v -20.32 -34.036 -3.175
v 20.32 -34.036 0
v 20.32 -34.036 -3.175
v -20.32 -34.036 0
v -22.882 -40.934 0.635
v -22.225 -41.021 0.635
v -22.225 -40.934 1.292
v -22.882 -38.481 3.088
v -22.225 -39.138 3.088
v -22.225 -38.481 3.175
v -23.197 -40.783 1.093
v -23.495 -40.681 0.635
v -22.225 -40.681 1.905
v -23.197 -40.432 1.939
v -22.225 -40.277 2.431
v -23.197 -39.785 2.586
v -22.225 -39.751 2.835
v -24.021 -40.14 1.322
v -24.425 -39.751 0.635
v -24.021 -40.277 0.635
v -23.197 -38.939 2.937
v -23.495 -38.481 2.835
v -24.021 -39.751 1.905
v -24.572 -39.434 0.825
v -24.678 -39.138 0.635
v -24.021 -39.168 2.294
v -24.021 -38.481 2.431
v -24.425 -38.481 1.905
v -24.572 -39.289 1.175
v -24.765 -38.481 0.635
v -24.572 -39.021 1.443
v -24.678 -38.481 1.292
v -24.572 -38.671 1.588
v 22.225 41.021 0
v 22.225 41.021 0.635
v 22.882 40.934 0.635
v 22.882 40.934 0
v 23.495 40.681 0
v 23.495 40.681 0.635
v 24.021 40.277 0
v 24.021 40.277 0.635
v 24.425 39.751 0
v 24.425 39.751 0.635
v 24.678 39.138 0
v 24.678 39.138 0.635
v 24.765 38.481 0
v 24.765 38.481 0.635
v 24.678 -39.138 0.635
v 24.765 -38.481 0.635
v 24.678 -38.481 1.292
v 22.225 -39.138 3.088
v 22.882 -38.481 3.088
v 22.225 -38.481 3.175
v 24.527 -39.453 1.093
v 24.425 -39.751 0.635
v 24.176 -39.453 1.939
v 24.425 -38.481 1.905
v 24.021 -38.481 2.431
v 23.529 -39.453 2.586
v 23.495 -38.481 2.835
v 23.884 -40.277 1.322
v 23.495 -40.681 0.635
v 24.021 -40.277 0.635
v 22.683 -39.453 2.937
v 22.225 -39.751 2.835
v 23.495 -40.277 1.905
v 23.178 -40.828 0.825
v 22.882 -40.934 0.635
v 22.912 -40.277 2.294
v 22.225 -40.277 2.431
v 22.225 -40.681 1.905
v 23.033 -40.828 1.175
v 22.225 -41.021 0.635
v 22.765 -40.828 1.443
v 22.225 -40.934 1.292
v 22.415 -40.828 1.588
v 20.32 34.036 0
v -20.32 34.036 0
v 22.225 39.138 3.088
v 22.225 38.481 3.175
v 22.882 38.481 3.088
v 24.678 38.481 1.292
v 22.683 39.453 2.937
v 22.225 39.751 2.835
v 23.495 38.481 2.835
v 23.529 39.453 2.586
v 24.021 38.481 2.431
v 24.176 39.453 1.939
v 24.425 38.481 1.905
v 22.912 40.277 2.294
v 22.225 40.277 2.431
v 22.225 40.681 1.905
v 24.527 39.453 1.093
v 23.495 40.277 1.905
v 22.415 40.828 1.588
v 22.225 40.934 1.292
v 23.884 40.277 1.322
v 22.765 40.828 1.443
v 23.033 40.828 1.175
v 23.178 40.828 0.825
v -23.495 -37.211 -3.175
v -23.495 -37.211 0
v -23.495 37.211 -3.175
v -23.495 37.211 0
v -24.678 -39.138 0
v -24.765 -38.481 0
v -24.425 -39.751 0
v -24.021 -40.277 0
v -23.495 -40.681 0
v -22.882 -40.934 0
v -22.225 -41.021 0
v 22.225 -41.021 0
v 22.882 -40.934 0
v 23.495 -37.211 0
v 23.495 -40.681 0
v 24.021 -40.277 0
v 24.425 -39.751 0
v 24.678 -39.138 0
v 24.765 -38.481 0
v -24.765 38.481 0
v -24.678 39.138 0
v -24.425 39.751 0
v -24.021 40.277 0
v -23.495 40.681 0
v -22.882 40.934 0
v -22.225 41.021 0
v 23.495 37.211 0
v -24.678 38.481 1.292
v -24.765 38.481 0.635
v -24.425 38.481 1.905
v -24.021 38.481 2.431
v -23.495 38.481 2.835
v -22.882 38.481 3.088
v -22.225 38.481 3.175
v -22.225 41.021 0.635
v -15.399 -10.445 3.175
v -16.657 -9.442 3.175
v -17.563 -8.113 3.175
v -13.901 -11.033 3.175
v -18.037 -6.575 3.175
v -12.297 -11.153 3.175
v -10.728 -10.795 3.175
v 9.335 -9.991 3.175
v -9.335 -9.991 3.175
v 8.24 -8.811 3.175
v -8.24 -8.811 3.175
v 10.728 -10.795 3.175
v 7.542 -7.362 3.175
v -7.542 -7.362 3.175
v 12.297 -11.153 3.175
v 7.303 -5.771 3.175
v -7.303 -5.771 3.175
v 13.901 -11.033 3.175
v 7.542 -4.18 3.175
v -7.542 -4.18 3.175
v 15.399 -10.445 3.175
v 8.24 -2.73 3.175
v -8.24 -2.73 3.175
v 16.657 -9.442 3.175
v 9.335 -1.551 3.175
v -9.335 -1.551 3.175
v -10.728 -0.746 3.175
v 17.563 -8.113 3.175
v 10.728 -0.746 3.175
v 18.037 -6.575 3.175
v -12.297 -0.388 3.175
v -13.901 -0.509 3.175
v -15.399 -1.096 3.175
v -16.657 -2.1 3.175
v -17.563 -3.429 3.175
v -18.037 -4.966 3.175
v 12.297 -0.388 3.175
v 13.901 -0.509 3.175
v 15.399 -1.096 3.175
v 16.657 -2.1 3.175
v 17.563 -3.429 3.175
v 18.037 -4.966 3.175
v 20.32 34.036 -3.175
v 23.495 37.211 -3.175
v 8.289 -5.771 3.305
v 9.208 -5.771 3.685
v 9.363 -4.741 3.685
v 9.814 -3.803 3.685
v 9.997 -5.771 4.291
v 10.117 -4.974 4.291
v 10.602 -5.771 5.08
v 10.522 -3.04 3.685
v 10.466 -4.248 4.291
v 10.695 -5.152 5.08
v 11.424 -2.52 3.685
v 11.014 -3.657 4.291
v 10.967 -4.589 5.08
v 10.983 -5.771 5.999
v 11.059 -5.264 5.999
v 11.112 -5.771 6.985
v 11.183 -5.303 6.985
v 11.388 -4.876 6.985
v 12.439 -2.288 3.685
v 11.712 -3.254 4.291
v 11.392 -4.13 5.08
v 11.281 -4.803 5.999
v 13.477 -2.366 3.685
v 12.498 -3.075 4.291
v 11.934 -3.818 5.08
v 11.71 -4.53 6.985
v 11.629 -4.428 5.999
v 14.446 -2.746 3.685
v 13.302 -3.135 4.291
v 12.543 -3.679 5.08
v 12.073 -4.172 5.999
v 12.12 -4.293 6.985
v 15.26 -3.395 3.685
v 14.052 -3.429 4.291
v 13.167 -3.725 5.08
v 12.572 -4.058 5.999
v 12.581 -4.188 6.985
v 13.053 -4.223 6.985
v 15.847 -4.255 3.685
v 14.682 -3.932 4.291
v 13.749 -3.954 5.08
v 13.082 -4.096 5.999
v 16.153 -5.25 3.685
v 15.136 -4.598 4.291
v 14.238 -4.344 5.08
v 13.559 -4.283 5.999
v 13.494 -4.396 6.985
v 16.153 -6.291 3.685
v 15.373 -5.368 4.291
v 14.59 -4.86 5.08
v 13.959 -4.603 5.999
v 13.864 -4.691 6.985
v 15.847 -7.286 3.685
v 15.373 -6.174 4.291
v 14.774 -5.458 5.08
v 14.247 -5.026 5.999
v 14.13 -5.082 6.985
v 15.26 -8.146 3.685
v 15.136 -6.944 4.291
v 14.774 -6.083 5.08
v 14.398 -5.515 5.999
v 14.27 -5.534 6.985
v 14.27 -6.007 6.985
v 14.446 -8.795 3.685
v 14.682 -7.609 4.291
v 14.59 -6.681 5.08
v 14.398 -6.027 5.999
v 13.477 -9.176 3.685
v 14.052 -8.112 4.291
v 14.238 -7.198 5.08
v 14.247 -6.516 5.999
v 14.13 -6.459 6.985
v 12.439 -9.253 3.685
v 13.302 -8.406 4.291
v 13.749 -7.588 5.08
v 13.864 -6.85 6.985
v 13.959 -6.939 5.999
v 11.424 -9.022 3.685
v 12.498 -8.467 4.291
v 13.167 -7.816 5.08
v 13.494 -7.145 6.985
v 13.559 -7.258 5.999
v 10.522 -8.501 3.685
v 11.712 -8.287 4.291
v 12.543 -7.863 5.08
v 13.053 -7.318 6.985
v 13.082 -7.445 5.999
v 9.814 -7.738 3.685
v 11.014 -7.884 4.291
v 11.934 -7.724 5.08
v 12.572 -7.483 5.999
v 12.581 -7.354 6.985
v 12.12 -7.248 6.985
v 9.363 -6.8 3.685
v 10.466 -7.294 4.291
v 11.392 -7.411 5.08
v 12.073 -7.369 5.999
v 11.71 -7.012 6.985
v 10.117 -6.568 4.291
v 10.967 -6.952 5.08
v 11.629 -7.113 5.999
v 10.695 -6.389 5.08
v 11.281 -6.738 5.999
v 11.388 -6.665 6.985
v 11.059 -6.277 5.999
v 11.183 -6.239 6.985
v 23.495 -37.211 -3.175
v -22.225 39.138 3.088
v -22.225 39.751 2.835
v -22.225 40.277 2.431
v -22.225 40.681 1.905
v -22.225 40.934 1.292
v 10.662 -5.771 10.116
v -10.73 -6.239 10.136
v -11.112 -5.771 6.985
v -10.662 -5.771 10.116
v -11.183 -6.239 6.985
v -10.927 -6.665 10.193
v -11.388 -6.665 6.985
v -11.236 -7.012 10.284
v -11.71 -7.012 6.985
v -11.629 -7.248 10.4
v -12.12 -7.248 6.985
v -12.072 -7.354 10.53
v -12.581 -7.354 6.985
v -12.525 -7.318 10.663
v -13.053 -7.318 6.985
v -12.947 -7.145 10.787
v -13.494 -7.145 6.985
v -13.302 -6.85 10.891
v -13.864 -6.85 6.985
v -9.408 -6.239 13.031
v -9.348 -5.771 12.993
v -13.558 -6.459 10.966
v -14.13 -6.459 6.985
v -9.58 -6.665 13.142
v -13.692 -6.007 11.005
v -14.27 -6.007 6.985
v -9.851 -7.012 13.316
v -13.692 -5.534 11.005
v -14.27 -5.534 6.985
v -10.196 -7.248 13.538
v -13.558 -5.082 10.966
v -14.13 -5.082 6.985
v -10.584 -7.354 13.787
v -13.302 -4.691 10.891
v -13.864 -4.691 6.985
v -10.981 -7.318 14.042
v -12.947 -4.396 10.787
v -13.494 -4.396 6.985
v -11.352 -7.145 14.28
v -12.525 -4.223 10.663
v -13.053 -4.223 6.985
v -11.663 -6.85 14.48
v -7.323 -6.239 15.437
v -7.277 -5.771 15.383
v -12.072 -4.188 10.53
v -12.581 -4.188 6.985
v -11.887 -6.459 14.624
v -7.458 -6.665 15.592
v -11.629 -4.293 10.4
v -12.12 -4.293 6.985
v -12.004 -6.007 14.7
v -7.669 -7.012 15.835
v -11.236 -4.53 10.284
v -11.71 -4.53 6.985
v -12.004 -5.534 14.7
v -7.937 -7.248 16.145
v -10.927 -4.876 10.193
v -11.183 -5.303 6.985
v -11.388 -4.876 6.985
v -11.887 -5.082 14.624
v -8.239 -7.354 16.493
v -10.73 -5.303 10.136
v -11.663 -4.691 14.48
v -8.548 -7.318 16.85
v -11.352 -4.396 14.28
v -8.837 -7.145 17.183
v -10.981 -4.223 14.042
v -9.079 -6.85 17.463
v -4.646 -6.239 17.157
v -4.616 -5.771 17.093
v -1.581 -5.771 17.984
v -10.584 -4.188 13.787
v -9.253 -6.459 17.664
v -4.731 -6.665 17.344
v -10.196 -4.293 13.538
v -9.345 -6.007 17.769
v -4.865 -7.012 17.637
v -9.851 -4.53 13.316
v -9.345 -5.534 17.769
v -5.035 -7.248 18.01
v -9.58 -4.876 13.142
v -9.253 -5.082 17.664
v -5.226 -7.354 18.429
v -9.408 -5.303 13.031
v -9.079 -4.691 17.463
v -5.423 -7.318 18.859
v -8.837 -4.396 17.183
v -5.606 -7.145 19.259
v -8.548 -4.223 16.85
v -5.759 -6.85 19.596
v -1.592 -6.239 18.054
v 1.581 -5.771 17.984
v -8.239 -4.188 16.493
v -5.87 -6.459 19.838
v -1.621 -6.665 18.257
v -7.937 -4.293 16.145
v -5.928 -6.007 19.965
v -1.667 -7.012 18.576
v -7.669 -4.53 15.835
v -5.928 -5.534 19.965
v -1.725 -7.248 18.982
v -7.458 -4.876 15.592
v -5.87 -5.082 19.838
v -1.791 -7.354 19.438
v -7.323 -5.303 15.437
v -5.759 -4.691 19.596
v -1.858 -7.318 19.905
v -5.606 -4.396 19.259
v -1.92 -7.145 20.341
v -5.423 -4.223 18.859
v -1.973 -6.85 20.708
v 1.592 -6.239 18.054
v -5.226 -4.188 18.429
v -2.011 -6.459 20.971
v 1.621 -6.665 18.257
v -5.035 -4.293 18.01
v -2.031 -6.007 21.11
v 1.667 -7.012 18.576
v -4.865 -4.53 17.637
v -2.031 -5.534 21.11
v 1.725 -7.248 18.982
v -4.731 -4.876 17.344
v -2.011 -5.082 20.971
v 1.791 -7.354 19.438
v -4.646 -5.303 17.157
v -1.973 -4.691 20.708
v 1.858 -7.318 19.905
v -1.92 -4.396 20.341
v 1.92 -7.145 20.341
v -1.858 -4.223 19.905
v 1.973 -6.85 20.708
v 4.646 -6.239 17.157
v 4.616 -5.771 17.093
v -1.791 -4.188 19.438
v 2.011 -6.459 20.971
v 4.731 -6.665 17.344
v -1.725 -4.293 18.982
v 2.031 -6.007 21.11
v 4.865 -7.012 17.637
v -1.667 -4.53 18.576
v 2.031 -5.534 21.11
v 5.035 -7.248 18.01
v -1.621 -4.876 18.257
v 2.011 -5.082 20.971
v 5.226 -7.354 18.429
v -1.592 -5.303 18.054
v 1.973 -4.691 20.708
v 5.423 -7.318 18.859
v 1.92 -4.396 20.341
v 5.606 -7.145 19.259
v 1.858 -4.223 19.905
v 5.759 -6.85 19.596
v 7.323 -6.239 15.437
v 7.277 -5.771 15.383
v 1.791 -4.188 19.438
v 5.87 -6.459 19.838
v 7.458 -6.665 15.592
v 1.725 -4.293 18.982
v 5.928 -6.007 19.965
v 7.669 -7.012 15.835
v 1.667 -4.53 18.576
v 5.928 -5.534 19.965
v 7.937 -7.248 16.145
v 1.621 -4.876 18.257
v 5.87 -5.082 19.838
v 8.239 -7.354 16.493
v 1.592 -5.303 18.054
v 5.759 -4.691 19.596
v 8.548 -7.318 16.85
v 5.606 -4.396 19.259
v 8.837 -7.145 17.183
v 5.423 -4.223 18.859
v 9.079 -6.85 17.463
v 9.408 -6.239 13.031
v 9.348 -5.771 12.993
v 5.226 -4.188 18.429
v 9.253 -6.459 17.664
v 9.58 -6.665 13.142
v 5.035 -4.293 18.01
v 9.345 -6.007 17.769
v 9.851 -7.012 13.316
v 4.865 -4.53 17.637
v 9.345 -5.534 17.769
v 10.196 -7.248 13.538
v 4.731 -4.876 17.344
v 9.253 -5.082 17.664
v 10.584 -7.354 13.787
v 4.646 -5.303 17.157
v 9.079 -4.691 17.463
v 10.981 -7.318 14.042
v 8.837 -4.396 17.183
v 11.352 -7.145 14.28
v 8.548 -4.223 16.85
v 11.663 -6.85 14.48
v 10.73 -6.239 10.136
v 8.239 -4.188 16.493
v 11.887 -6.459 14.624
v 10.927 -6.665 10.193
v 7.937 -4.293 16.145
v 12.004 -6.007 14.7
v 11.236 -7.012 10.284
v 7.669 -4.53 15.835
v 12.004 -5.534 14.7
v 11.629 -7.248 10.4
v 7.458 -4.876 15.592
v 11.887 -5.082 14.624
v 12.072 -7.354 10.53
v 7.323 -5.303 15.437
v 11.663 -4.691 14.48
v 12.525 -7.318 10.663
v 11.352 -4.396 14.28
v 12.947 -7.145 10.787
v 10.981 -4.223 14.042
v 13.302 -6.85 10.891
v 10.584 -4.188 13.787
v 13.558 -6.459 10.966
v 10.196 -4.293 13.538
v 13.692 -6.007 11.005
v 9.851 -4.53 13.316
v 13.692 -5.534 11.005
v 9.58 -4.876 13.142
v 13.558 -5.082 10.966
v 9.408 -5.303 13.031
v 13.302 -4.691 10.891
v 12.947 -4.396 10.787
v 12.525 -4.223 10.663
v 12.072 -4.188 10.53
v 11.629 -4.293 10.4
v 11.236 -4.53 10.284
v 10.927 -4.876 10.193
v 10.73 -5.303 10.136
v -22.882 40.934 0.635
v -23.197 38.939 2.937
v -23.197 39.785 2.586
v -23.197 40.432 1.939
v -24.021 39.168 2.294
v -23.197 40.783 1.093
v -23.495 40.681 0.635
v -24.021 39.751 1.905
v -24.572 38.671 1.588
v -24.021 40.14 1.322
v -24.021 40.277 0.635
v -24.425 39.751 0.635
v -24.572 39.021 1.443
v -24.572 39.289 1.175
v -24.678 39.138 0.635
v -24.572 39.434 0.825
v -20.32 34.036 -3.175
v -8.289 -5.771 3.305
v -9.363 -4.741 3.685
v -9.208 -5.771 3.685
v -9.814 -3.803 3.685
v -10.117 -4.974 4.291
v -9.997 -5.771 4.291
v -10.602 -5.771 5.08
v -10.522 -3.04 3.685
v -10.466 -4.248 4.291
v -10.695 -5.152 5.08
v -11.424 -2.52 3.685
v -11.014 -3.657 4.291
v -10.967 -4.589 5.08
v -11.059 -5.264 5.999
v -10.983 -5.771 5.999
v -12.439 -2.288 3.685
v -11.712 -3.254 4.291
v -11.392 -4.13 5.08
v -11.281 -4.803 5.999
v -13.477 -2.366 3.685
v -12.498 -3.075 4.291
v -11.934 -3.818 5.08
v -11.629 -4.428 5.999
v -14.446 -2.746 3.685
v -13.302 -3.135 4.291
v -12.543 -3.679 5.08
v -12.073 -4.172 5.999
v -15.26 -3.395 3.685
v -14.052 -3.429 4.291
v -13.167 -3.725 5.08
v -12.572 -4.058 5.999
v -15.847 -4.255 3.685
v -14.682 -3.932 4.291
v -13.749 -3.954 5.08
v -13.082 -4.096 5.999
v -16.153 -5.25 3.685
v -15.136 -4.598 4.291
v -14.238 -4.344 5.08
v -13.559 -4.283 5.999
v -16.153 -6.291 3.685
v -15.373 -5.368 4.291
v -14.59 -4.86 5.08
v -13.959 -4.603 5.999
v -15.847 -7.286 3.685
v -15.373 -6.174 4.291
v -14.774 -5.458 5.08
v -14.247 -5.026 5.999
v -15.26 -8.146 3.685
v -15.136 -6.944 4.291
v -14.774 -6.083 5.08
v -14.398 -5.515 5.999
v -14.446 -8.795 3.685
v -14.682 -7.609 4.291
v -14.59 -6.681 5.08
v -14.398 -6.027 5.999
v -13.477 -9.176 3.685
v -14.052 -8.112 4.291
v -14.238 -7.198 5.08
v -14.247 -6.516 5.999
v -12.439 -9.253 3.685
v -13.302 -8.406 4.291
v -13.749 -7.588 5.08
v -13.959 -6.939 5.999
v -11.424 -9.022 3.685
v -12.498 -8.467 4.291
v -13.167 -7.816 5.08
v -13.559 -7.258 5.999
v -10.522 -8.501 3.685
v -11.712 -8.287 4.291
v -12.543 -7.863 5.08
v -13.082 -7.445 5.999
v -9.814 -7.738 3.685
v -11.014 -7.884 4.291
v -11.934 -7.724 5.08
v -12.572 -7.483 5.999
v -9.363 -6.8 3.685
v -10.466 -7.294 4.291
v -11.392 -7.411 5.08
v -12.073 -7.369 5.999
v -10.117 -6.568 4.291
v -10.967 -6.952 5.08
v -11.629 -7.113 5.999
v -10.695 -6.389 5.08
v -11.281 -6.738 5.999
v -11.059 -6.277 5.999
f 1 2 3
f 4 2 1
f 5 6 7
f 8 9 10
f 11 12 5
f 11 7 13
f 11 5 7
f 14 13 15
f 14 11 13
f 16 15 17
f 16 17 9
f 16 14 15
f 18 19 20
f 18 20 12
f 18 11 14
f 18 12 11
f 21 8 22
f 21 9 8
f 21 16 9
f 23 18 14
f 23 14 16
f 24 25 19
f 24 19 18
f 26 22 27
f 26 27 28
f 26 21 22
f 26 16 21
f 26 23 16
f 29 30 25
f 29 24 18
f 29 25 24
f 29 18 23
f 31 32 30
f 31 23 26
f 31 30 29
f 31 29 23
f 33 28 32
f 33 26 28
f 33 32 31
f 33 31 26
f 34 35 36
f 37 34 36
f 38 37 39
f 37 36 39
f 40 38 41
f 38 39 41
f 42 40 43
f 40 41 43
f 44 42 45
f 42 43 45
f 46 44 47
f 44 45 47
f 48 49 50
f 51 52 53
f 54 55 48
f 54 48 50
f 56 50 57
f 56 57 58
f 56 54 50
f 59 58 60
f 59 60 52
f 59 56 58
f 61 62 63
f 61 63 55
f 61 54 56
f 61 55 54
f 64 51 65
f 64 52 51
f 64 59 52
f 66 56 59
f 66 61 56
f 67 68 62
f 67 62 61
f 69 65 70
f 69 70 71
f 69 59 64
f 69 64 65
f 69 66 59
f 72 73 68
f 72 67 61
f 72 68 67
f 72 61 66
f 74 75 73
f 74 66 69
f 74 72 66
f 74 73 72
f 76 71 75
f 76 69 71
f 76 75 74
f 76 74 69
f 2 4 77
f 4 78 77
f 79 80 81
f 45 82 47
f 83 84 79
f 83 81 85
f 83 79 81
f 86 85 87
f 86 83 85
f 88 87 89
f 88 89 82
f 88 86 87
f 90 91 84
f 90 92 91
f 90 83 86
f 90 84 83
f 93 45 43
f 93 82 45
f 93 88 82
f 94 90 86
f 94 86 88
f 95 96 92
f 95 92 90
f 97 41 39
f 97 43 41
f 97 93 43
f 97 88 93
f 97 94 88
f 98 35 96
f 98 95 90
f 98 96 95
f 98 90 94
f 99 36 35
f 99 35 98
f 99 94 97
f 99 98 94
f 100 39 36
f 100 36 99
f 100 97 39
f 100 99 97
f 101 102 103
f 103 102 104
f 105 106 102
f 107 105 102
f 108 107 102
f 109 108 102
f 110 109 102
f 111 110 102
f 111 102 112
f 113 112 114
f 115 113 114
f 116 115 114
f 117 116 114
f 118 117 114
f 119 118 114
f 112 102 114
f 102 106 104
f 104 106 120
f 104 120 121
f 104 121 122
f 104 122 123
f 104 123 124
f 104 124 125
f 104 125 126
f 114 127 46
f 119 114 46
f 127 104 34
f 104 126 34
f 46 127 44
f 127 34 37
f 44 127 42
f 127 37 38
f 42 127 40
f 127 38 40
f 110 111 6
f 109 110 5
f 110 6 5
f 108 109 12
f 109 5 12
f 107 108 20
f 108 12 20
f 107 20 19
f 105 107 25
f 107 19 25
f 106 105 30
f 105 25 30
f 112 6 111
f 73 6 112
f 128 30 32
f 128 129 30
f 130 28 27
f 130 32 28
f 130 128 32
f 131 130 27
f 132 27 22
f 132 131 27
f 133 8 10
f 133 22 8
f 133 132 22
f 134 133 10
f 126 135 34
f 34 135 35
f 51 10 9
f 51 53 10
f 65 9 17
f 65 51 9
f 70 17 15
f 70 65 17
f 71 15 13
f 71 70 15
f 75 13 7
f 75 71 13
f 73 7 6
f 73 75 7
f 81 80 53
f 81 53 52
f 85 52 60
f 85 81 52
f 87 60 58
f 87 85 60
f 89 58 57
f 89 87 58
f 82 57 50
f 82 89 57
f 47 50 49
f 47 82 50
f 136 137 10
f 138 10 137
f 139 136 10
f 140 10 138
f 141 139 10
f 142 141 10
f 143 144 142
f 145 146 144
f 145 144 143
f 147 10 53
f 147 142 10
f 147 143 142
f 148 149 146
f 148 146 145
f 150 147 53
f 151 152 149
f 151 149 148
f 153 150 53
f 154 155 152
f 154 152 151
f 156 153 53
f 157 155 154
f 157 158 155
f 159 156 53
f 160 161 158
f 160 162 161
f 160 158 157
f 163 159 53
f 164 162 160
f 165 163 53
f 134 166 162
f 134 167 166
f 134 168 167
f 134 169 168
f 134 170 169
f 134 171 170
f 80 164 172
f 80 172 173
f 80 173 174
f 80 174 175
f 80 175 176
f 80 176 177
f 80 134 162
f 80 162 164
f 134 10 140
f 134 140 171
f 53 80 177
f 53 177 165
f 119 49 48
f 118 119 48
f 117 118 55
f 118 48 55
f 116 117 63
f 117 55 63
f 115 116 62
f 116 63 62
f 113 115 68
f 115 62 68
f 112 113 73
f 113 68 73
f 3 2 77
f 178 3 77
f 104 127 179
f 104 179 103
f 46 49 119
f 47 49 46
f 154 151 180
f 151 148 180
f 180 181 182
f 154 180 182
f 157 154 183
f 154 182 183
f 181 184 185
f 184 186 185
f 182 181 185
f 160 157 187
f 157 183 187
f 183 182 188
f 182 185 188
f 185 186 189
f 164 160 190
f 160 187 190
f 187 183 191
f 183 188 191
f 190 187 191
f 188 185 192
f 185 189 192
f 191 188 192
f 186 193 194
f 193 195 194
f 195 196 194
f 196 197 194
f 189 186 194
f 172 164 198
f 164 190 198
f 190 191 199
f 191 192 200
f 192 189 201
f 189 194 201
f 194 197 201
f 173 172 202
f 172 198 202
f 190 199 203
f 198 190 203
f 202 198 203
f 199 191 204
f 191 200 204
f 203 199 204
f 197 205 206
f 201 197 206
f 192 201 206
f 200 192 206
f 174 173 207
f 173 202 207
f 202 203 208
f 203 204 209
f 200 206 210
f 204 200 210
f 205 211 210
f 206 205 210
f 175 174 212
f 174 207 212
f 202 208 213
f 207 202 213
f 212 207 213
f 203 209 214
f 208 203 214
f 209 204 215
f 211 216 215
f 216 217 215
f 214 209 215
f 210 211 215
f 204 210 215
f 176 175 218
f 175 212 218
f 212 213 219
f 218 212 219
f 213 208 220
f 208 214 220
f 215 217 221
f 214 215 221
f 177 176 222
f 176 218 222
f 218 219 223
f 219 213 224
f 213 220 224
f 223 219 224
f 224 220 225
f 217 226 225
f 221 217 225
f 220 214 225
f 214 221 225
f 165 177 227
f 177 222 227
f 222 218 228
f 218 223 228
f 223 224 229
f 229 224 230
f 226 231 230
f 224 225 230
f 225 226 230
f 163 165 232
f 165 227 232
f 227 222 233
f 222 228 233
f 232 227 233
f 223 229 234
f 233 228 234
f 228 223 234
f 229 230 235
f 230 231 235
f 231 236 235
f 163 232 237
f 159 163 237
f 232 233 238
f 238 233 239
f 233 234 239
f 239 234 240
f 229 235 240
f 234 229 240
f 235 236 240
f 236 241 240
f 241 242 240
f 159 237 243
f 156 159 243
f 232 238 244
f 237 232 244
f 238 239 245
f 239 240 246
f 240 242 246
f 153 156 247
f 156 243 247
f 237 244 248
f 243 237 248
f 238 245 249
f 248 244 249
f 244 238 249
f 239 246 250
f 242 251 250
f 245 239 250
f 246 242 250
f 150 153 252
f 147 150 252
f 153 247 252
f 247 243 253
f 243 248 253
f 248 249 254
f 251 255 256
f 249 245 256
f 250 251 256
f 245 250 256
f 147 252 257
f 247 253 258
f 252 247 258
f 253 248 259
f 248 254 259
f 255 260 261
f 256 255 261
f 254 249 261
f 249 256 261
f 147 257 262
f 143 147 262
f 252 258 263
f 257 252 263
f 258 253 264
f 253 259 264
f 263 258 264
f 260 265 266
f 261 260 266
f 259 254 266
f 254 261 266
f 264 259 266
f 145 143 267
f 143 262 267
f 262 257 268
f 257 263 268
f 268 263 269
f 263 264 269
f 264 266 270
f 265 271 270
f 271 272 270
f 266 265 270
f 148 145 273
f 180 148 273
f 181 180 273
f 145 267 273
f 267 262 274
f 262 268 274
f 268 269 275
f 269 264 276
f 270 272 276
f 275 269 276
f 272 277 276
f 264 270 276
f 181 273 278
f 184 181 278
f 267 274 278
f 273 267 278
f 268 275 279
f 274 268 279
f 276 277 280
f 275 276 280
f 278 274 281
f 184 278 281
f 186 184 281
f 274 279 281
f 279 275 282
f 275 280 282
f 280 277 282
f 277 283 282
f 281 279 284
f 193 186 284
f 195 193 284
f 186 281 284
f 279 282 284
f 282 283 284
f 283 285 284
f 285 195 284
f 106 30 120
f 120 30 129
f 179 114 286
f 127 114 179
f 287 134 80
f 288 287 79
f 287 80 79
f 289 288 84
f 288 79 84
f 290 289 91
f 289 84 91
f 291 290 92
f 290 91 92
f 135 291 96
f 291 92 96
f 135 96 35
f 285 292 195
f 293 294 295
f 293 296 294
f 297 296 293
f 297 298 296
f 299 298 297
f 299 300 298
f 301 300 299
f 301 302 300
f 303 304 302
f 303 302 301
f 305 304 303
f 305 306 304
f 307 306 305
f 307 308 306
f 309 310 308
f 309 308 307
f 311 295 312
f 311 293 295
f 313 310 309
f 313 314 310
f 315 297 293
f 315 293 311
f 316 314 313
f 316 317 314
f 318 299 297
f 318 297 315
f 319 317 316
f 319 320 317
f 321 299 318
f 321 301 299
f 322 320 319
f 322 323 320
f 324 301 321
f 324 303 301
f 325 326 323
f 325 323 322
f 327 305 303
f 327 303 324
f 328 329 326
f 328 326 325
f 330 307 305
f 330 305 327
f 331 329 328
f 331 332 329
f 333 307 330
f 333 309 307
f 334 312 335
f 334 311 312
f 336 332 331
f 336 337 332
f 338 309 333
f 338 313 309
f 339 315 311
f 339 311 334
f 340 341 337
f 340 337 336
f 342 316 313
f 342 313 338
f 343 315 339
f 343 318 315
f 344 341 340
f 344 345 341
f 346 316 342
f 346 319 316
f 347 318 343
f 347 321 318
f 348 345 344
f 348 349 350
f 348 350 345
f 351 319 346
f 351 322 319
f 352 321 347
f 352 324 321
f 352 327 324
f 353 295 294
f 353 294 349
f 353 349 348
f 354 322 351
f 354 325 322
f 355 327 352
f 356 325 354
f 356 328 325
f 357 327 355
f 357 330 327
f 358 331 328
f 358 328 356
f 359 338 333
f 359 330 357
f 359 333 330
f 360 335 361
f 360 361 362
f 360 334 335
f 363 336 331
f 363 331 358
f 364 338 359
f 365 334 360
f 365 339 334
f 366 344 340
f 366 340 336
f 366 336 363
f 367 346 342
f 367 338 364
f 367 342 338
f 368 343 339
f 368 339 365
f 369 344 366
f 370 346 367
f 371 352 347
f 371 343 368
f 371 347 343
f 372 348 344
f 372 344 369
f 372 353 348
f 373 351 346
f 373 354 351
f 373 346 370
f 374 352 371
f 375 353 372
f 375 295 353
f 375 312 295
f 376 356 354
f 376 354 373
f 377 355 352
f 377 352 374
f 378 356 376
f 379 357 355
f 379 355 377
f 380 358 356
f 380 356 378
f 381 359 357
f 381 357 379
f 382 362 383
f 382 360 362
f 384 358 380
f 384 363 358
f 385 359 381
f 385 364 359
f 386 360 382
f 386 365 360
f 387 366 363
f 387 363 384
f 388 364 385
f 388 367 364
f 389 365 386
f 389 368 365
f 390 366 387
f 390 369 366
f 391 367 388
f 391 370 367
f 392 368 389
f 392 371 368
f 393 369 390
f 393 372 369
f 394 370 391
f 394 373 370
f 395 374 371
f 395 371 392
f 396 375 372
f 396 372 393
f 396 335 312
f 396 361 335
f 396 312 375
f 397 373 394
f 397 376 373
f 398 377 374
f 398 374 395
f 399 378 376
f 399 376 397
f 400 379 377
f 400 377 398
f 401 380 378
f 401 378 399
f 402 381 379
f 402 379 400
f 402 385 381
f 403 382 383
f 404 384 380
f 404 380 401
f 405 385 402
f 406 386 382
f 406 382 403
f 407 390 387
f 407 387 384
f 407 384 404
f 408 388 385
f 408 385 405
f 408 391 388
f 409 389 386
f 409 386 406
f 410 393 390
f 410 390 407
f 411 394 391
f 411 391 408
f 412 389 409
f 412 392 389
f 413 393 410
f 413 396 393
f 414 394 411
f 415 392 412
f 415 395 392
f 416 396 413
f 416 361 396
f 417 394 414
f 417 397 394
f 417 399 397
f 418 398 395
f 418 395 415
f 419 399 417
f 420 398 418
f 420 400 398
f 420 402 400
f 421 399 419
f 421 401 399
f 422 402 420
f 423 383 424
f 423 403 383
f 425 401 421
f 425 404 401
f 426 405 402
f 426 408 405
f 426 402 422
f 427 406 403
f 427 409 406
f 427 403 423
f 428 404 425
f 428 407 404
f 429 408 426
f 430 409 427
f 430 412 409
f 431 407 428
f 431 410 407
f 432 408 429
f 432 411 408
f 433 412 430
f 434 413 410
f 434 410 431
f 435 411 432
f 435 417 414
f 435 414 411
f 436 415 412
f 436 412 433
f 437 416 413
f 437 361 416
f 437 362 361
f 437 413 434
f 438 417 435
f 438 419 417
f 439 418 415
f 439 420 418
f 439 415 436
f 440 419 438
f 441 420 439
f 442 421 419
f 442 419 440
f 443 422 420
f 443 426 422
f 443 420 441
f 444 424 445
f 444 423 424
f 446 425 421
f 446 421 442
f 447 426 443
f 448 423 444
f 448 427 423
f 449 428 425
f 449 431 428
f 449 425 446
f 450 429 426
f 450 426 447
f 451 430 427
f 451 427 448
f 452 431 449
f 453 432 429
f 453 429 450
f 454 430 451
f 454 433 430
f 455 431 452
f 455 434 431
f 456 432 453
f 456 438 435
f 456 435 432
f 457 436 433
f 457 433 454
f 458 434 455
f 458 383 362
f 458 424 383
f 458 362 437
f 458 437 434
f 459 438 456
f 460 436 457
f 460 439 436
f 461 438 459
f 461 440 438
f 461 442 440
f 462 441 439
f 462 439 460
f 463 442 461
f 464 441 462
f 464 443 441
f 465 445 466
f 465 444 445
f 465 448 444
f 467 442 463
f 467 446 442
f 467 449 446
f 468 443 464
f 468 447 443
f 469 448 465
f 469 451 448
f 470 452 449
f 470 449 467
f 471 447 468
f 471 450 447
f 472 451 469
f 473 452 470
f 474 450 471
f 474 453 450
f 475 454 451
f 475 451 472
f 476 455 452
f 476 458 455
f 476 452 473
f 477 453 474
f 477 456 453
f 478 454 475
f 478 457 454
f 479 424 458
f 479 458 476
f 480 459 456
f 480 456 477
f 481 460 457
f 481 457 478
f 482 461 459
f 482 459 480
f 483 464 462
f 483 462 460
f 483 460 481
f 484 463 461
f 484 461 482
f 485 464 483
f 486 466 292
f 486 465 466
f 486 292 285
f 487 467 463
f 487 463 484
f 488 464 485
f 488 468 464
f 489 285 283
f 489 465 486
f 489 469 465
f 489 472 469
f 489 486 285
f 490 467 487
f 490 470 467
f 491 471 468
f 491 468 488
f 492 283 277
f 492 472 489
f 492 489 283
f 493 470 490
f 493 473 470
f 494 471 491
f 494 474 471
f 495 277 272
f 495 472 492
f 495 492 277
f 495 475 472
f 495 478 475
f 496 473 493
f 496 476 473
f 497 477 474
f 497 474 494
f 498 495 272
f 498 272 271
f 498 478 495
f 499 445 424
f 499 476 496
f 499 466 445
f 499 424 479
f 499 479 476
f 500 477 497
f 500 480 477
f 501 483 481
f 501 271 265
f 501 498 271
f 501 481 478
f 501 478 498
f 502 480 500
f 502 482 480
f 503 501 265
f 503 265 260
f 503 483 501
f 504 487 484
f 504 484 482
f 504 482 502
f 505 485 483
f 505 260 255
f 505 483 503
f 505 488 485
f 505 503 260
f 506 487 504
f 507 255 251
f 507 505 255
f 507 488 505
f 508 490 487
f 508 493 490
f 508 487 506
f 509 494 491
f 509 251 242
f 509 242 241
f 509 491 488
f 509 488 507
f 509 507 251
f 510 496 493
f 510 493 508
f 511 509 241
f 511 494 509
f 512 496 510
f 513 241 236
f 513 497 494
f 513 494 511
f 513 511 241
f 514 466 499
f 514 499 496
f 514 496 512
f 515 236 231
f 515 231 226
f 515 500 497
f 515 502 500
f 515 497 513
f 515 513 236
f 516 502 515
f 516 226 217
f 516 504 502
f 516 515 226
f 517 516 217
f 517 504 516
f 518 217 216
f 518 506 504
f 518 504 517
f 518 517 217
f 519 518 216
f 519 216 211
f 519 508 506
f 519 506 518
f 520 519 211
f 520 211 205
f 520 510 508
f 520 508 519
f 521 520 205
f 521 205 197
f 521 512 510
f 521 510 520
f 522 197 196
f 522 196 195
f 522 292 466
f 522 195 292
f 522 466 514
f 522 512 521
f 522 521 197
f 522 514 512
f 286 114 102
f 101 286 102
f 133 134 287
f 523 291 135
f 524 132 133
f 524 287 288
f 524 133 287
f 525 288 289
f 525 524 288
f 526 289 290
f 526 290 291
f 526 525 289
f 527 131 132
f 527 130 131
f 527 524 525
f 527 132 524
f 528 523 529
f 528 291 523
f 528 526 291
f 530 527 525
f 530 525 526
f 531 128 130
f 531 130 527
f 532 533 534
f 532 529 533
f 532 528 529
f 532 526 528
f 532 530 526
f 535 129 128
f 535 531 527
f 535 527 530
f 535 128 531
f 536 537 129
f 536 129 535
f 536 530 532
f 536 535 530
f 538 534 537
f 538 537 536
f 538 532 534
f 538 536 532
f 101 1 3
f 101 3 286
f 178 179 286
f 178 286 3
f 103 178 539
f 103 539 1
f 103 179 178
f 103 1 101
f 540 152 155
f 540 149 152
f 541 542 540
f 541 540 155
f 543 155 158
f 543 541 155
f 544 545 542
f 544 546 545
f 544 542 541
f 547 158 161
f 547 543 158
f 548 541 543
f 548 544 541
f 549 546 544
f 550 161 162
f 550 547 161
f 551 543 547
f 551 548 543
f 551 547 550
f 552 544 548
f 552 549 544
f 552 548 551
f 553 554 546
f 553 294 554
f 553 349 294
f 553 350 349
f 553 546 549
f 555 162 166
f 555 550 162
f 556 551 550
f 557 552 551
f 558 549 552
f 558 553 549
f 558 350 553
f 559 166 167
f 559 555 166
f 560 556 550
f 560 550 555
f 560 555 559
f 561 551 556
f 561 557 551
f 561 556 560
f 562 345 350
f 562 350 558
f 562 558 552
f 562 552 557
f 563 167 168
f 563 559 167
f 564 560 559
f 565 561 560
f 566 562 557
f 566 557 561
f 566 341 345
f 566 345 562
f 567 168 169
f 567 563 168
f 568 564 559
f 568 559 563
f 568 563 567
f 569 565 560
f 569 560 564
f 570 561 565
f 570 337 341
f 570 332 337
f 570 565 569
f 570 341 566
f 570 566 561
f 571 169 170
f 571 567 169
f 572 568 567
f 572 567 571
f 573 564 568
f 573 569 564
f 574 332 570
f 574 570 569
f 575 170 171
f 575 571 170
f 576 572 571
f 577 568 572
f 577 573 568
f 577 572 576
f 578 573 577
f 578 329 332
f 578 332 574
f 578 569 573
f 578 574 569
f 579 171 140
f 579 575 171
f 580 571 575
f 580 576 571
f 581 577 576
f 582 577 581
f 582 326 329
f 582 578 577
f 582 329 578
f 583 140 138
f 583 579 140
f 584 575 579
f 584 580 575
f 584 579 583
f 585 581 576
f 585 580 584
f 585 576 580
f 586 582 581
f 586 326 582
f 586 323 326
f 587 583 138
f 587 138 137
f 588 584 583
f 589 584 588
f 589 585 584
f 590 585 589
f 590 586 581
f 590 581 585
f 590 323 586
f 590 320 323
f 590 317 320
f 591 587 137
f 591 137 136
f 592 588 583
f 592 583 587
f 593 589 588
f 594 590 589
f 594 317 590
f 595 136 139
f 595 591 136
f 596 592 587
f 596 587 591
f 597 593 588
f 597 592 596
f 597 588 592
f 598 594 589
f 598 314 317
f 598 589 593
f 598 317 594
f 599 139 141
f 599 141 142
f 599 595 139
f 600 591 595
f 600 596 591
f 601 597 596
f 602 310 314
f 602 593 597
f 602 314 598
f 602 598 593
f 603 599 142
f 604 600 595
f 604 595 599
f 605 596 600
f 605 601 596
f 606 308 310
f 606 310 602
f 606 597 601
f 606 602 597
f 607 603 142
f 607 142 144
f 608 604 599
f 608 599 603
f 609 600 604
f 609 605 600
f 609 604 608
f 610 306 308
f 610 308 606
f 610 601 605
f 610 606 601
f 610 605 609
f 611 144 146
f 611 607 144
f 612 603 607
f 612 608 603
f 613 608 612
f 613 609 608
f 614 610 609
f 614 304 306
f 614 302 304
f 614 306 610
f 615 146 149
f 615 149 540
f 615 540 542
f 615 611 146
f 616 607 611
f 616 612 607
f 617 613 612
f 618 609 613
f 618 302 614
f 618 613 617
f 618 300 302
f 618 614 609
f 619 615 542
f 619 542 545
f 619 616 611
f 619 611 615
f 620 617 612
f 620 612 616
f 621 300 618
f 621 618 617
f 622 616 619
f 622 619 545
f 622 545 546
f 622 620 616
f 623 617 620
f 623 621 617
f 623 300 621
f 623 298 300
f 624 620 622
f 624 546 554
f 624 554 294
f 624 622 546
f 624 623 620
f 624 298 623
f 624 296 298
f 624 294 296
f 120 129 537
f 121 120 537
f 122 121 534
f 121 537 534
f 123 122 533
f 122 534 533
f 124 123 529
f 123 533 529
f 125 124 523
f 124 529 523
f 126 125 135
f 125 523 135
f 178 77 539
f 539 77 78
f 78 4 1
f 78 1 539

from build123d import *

# Parameters (mm, degrees)
BOSS_EXTRUDE1_DEPTH = 3.175
SWEEP1_PROFILE_R    = 1.5875
FILLET1_R           = 3.81
SKETCH14_W          = 49.53
SKETCH14_H          = 3.81
BOSS_EXTRUDE4_DEPTH = 3.175
FILLET2_R           = 2.54
FILLET4_R           = 2.54
SKETCH15_W          = 46.99
SKETCH15_H          = 74.422
SKETCH15_W_2        = 40.64
SKETCH15_H_2        = 68.072
BOSS_EXTRUDE6_DEPTH = 3.175


# Some blends are built 0.0001 mm under size
with BuildPart() as part:
    # Sketch1 → Boss-Extrude1 (new body)
    with BuildSketch(Plane.XY):
        Polygon((-24.765, -37.211), (24.765, -37.211), (24.765, -18.570359608), (24.765, 0.678999912), (24.765, 37.211), (-24.765, 37.211), (-24.765, 0.678999912), (-24.765, -18.570359608), align=None)
    extrude(amount=BOSS_EXTRUDE1_DEPTH)

    # Sweep1: sweep along a path in Sketch7
    with BuildLine(Plane(origin=(0, -5.770679848, 0), x_dir=(1, 0, 0), z_dir=(0, 1, 0))) as sweep1_path:
        Line((-12.7, -3.175), (-12.7, -6.985))
        ThreePointArc((-12.7, -6.985), (0, -19.685), (12.7, -6.985))
        Line((12.7, -6.985), (12.7, -3.175))
    # Sweep1 profile (on start of the path) → Sweep1 (sweep)
    with BuildSketch(Plane(origin=(-12.7, -5.770679848, 3.175), x_dir=(1, 0, 0), z_dir=(0, 0, 1))):
        Circle(SWEEP1_PROFILE_R)
    sweep(path=sweep1_path.line)

    # Fillet1
    fillet1_edges = [part.edges().sort_by_distance(p)[0] for p in [
        (14.2875, -5.770679848, 3.175),
        (-14.2875, -5.770679848, 3.175),
    ]]
    fillet(fillet1_edges, radius=FILLET1_R - 0.0001)  # a hair under: the kernel refuses the full size

    # Sketch14 → Boss-Extrude4 (add)
    with BuildSketch(Plane.XY.offset(3.175)):
        with Locations((0, -39.116)):
            Rectangle(SKETCH14_W, SKETCH14_H)
        with Locations((0, 39.116)):
            Rectangle(SKETCH14_W, SKETCH14_H)
    extrude(amount=-BOSS_EXTRUDE4_DEPTH)

    # Fillet2
    fillet2_edges = [part.edges().sort_by_distance(p)[0] for p in [
        (-24.765, 0, 3.175),
        (0, -41.021, 3.175),
        (24.765, 0, 3.175),
        (0, 41.021, 3.175),
    ]]
    fillet(fillet2_edges, radius=FILLET2_R)

    # Fillet4
    # the kernel refuses this fillet: 2.54 mm, written as the material it takes off along each edge
    with BuildSketch(Plane(origin=(-22.225, -38.481, 0.635), x_dir=(0, -1, 0), z_dir=(-1, 0, 0))) as fillet4_piece_1_section:
        Polygon((0, 0), (FILLET4_R, 0), (FILLET4_R, FILLET4_R), (0, FILLET4_R), align=None)
    fillet4_piece_1 = extrude(amount=FILLET4_R, mode=Mode.PRIVATE)
    fillet4_piece_1 = fillet4_piece_1 - Plane(origin=(-22.225, -38.481, 0.635), x_dir=(0, 0.7071067811865475, -0.7071067811865475), z_dir=(-1, 0, 0)) * Sphere(FILLET4_R, mode=Mode.PRIVATE)
    add(fillet4_piece_1, mode=Mode.SUBTRACT)
    with BuildSketch(Plane(origin=(-22.225, 38.481, 0.635), x_dir=(0, 1, 0), z_dir=(-1, 0, 0))) as fillet4_piece_2_section:
        Polygon((0, 0), (FILLET4_R, 0), (FILLET4_R, -FILLET4_R), (0, -FILLET4_R), align=None)
    fillet4_piece_2 = extrude(amount=FILLET4_R, mode=Mode.PRIVATE)
    fillet4_piece_2 = fillet4_piece_2 - Plane(origin=(-22.225, 38.481, 0.635), x_dir=(0, -0.7071067811865475, -0.7071067811865475), z_dir=(-1, 0, 0)) * Sphere(FILLET4_R, mode=Mode.PRIVATE)
    add(fillet4_piece_2, mode=Mode.SUBTRACT)
    with BuildSketch(Plane(origin=(22.225, -38.481, 0.635), x_dir=(1, 0, 0), z_dir=(0, -1, 0))) as fillet4_piece_3_section:
        Polygon((0, 0), (FILLET4_R, 0), (FILLET4_R, FILLET4_R), (0, FILLET4_R), align=None)
    fillet4_piece_3 = extrude(amount=FILLET4_R, mode=Mode.PRIVATE)
    fillet4_piece_3 = fillet4_piece_3 - Plane(origin=(22.225, -38.481, 0.635), x_dir=(-0.7071067811865475, 1.0781380386361295e-15, -0.7071067811865475), z_dir=(0, -1, 0)) * Sphere(FILLET4_R, mode=Mode.PRIVATE)
    add(fillet4_piece_3, mode=Mode.SUBTRACT)
    with BuildSketch(Plane(origin=(22.225, 38.481, 0.635), x_dir=(1, 0, 0), z_dir=(0, 1, 0))) as fillet4_piece_4_section:
        Polygon((0, 0), (FILLET4_R, 0), (FILLET4_R, -FILLET4_R), (0, -FILLET4_R), align=None)
    fillet4_piece_4 = extrude(amount=FILLET4_R, mode=Mode.PRIVATE)
    fillet4_piece_4 = fillet4_piece_4 - Plane(origin=(22.225, 38.481, 0.635), x_dir=(-0.7071067811865475, 1.0781380386361295e-15, -0.7071067811865475), z_dir=(0, 1, 0)) * Sphere(FILLET4_R, mode=Mode.PRIVATE)
    add(fillet4_piece_4, mode=Mode.SUBTRACT)
    with BuildSketch(Plane(origin=(24.765, -41.021, 0.635), x_dir=(-1, 0, 0), z_dir=(0, 0, -1)), Plane(origin=(-24.765, -41.021, 0.635), x_dir=(0, 1, 0), z_dir=(0, 0, -1))) as fillet4_piece_5:
        with BuildLine():
            CenterArc((FILLET4_R, FILLET4_R), FILLET4_R, 180, 90)
            Line((0, FILLET4_R), (0, 0))
            Line((0, 0), (FILLET4_R, 0))
        make_face()
    extrude(amount=6.985, mode=Mode.SUBTRACT)
    with BuildSketch(Plane(origin=(24.765, 41.021, 0.635), x_dir=(-1, 0, 0), z_dir=(0, 0, -1)), Plane(origin=(-24.765, 41.021, 0.635), x_dir=(0, -1, 0), z_dir=(0, 0, -1))) as fillet4_piece_6:
        with BuildLine():
            CenterArc((FILLET4_R, -FILLET4_R), FILLET4_R, 90, 90)
            Line((0, -FILLET4_R), (0, 0))
            Line((0, 0), (FILLET4_R, 0))
        make_face()
    extrude(amount=6.985, mode=Mode.SUBTRACT)

    # Sketch15 → Boss-Extrude6 (add)
    with BuildSketch(Plane(origin=(0, 0, 0), x_dir=(-1, 0, 0), z_dir=(0, 0, -1))):
        Rectangle(SKETCH15_W, SKETCH15_H)
        Rectangle(SKETCH15_W_2, SKETCH15_H_2, mode=Mode.SUBTRACT)
    extrude(amount=BOSS_EXTRUDE6_DEPTH)


solid = part.part
